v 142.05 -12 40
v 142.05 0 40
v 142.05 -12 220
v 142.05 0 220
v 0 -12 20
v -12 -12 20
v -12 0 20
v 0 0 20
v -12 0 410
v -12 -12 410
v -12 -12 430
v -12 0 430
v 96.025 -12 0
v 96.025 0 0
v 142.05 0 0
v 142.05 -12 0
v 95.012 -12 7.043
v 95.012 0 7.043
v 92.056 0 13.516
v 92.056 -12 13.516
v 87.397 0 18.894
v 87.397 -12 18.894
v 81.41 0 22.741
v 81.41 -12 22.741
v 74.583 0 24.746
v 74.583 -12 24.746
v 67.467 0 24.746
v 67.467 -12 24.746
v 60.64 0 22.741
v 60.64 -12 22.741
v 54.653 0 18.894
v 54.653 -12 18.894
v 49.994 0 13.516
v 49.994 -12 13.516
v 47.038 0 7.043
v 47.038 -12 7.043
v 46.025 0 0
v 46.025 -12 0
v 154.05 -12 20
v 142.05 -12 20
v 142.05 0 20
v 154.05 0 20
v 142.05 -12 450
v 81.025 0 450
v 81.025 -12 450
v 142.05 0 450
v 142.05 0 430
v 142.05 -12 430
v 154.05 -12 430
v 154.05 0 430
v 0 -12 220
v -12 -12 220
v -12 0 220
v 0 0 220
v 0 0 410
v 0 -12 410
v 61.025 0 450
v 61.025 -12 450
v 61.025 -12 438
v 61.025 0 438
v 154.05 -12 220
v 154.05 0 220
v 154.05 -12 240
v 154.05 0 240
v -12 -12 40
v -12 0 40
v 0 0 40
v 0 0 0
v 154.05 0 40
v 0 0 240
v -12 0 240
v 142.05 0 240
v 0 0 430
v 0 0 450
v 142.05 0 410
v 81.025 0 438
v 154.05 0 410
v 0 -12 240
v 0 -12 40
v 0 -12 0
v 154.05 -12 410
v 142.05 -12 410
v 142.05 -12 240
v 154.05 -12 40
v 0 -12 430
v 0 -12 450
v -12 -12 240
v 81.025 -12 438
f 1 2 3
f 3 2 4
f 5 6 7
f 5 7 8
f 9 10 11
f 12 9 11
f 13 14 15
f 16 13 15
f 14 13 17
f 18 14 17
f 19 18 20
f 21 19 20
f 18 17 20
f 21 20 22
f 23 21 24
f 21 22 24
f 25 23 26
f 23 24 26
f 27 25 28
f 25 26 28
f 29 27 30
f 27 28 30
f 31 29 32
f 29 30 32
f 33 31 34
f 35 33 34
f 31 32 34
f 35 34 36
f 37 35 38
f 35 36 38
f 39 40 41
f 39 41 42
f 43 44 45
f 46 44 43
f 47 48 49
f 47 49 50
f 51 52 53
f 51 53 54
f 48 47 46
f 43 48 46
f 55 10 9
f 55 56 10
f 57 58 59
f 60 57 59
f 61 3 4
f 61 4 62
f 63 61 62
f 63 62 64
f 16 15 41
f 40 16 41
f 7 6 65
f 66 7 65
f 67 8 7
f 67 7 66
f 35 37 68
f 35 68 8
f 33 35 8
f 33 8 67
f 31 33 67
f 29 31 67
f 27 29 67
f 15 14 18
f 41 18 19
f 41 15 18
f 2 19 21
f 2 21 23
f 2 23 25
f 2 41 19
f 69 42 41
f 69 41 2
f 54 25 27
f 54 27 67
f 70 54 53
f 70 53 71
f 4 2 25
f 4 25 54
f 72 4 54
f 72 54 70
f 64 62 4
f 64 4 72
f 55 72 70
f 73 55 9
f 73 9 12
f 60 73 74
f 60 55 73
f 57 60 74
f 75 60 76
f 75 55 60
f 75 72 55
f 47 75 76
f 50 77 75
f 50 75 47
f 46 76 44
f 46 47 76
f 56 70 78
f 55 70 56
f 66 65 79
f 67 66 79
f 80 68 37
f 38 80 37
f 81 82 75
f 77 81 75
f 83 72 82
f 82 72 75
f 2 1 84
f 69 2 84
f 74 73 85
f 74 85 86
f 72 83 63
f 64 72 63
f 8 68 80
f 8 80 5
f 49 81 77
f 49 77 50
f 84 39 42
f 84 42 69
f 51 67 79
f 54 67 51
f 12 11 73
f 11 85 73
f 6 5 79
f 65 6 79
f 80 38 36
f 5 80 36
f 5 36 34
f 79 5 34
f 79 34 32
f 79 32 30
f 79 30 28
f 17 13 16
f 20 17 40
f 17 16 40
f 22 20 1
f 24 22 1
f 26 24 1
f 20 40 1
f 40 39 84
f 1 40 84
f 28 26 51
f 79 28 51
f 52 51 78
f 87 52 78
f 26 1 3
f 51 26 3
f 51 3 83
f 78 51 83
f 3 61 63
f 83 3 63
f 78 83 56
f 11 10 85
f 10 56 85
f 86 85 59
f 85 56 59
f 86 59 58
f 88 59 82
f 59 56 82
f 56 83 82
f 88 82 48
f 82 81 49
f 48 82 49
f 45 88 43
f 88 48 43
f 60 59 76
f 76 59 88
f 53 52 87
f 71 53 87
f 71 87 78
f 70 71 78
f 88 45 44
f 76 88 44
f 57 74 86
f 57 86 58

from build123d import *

# Parameters (mm, degrees)
F0_W      = 142.05
F0_H      = 460
F1_DEPTH  = 12
F2_W      = 10
F2_H      = 20
F3_DEPTH  = 12
F4_DEPTH  = 25
F5_DEPTH  = 2
F7_DEPTH  = 25
F8_DEPTH  = 10
F9_DEPTH  = 2
F10_DEPTH = 2


with BuildPart() as f1:
    # F0 (on Front) → F1 (new body)
    with BuildSketch(Plane.XZ):
        with Locations((71.025, 230)):
            Rectangle(F0_W, F0_H)
    extrude(amount=F1_DEPTH)

    # F2 (on face) → F3 (join)
    with BuildSketch(Plane.XZ.offset(12)):
        with Locations((-5, 420)):
            Rectangle(F2_W, F2_H)
        with Locations((147.05, 420)):
            Rectangle(F2_W, F2_H)
        with Locations((-5, 230)):
            Rectangle(F2_W, F2_H)
        with Locations((147.05, 230)):
            Rectangle(F2_W, F2_H)
        with Locations((-5, 30)):
            Rectangle(F2_W, F2_H)
        with Locations((147.05, 30)):
            Rectangle(F2_W, F2_H)
    extrude(amount=-F3_DEPTH)

    # F2 (on face) → F4 (cut)
    with BuildSketch(Plane.XZ.offset(12)):
        Polygon((61.025, 480), (61.025, 460), (71.025, 460), (81.025, 460), (81.025, 480), align=None)
        Polygon((71.025, 460), (61.025, 460), (61.025, 440), (81.025, 440), (81.025, 460), align=None)
    extrude(amount=-F4_DEPTH, mode=Mode.SUBTRACT)

    # F5 (cut): a face of the model
    f5_faces = [f1.faces().sort_by_distance(p)[0] for p in [
        (71.025, -6, 440),
    ]]
    extrude(f5_faces, amount=-F5_DEPTH, mode=Mode.SUBTRACT)

    # F6 (on face) → F7 (cut)
    with BuildSketch(Plane.XZ.offset(12)):
        with BuildLine():
            Line((46.025, 0), (96.025, 0))
            ThreePointArc((96.025, 0), (71.025, 25), (46.025, 0))
        make_face()
    extrude(amount=-F7_DEPTH, mode=Mode.SUBTRACT)

    # F8 (cut): faces of the model
    f8_faces = [f1.faces().sort_by_distance(p)[0] for p in [
        (30.5125, -6, 460),
        (111.5375, -6, 460),
    ]]
    extrude(f8_faces, amount=-F8_DEPTH, mode=Mode.SUBTRACT)

    # F9 (add): faces of the model
    f9_faces = [f1.faces().sort_by_distance(p)[0] for p in [
        (152.05, -6, 420),
        (152.05, -6, 230),
        (152.05, -6, 30),
    ]]
    extrude(f9_faces, amount=F9_DEPTH)

    # F10 (add): faces of the model
    f10_faces = [f1.faces().sort_by_distance(p)[0] for p in [
        (-10, -6, 420),
        (-10, -6, 230),
        (-10, -6, 30),
    ]]
    extrude(f10_faces, amount=F10_DEPTH)


solid = f1.part
